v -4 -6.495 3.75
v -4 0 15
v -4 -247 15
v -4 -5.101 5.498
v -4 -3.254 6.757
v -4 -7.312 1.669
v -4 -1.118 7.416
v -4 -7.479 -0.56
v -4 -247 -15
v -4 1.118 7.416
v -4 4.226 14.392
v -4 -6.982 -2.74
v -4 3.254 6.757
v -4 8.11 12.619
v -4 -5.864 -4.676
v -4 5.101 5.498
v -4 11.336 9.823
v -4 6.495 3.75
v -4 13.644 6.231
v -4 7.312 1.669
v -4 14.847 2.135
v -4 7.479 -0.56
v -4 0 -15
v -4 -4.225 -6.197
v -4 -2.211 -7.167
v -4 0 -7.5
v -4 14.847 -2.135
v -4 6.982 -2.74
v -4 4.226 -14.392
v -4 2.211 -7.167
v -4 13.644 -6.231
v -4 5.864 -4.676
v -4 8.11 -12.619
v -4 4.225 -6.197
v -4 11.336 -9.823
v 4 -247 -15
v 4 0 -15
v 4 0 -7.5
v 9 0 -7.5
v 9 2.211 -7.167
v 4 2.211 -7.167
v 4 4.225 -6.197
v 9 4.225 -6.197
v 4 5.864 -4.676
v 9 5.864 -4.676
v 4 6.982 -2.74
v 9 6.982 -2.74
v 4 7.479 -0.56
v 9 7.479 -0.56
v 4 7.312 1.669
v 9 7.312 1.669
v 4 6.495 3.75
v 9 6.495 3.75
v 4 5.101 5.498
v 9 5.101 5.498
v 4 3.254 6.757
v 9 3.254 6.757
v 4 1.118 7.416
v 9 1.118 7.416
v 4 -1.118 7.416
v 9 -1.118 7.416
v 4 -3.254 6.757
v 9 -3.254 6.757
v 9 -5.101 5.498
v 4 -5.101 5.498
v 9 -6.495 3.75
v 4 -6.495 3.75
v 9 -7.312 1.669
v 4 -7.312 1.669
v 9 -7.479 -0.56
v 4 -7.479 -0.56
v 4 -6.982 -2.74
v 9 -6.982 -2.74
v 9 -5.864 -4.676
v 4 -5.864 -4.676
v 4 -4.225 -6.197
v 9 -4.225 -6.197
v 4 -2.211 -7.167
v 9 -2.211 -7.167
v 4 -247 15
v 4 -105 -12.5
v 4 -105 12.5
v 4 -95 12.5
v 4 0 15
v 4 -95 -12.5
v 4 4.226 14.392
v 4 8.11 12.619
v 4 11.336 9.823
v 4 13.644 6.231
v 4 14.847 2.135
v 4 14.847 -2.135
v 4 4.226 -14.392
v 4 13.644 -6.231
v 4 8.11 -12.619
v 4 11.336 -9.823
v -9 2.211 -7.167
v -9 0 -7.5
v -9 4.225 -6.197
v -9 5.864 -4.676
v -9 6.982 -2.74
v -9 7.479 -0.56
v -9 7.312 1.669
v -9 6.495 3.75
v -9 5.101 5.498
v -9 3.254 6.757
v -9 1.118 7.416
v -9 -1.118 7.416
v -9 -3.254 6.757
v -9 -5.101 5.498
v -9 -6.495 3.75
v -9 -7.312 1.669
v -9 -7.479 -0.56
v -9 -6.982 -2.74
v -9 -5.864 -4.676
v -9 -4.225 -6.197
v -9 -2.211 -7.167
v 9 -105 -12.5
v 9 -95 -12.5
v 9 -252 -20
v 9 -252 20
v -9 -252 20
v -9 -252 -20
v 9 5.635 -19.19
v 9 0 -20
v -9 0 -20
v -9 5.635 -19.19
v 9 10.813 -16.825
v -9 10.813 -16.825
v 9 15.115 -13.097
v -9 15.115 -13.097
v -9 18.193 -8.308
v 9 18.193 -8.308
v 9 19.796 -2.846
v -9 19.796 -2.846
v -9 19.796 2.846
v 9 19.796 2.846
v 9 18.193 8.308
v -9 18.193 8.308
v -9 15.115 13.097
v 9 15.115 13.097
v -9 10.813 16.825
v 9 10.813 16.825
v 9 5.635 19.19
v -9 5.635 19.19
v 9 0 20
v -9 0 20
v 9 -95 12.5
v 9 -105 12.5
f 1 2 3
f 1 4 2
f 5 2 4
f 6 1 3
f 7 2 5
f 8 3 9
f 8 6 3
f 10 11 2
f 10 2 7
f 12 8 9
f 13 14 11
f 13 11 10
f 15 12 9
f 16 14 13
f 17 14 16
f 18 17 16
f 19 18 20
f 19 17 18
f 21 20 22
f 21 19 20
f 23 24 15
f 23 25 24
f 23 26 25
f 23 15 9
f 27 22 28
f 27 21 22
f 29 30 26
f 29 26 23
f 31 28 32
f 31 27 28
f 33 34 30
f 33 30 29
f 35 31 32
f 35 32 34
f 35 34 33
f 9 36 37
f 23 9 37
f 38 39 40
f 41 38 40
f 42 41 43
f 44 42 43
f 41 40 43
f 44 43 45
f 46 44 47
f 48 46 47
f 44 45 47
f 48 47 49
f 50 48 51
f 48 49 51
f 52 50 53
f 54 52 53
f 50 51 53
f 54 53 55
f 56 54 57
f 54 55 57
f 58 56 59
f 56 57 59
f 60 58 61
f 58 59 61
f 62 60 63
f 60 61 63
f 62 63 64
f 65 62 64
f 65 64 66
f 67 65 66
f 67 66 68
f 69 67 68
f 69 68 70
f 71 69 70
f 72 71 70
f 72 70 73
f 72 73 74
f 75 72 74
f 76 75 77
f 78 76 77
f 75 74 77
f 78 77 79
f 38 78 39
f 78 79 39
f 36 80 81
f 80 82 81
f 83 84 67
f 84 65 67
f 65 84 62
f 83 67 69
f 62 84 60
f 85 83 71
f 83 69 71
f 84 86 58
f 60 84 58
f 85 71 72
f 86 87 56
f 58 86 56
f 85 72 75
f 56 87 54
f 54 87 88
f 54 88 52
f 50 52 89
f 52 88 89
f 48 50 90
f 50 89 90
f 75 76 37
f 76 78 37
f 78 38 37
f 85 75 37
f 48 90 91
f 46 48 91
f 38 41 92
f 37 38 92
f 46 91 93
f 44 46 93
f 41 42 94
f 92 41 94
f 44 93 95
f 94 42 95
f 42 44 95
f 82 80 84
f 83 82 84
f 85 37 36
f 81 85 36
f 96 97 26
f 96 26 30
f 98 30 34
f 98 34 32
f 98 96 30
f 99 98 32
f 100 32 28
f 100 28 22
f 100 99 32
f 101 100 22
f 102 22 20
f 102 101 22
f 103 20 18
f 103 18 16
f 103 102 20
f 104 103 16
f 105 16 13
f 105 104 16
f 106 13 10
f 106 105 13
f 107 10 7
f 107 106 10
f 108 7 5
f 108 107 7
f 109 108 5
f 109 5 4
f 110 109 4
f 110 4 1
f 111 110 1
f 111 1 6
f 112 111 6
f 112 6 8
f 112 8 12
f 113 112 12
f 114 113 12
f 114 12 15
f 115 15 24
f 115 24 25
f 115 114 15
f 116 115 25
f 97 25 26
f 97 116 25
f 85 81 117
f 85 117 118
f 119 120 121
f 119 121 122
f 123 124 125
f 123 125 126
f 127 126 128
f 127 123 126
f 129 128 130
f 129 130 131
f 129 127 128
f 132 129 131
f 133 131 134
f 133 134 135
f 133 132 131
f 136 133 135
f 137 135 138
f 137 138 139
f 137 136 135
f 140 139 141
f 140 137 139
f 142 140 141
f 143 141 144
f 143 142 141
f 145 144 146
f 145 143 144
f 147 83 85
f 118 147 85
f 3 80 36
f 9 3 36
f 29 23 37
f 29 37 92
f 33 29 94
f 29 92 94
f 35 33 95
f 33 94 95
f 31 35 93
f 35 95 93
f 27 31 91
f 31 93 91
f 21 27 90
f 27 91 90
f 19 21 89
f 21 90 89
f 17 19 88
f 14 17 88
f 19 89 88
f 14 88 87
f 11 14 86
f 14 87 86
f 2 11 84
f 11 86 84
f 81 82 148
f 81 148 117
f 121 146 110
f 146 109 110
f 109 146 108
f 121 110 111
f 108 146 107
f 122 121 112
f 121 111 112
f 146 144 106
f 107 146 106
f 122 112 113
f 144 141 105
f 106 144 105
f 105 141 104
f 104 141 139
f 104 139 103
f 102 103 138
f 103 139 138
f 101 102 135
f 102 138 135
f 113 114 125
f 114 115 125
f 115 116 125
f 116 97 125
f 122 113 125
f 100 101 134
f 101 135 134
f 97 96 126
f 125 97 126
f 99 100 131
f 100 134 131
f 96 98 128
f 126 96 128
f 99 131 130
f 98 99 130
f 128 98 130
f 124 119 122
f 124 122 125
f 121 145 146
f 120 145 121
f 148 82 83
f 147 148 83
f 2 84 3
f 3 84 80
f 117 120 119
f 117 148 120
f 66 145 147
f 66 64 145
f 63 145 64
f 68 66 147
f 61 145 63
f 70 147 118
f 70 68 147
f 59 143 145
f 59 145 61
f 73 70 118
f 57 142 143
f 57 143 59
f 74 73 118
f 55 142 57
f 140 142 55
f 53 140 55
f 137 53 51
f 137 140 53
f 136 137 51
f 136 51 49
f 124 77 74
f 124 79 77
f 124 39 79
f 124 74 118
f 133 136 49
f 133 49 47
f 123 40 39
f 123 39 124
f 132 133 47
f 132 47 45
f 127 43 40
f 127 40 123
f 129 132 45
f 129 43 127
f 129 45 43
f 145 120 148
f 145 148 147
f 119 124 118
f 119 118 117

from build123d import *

# Parameters (mm, degrees)
BOSS_EXTRUDE1_START = -9
SKETCH2_R           = 7.5
BOSS_EXTRUDE1_DEPTH = 5
BOSS_EXTRUDE2_START = -4
BOSS_EXTRUDE2_DEPTH = 4
CUT_EXTRUDE1_START  = 4
SKETCH4_W           = 25
SKETCH4_H           = 10
CUT_EXTRUDE1_DEPTH  = 5


with BuildPart() as part:
    # Sketch2 → Boss-Extrude1 (new body)
    with BuildSketch(Plane(origin=(0, 0, 0), x_dir=(0, 0, -1), z_dir=(1, 0, 0)).offset(BOSS_EXTRUDE1_START)):
        with BuildLine():
            Line((-20, 0), (-20, -252))
            Line((-20, -252), (20, -252))
            Line((20, -252), (20, 0))
            ThreePointArc((20, 0), (0, 20), (-20, 0))
        make_face()
        Circle(SKETCH2_R, mode=Mode.SUBTRACT)
    extrude(amount=BOSS_EXTRUDE1_DEPTH)

    # Sketch2<6> → Boss-Extrude2 (add)
    with BuildSketch(Plane(origin=(0, 0, 0), x_dir=(0, 0, -1), z_dir=(1, 0, 0)).offset(BOSS_EXTRUDE2_START)):
        with BuildLine():
            Line((-20, 0), (-20, -252))
            Line((-20, -252), (20, -252))
            Line((20, -252), (20, 0))
            ThreePointArc((20, 0), (0, 20), (-20, 0))
        make_face()
        with BuildLine():
            Line((-15, 0), (-15, -247))
            Line((-15, -247), (15, -247))
            Line((15, -247), (15, 0))
            ThreePointArc((15, 0), (0, 15), (-15, 0))
        make_face(mode=Mode.SUBTRACT)
    extrude(amount=BOSS_EXTRUDE2_DEPTH)

    # Mirror1: part across plane


with BuildPart() as part_1:
    add(part.part)
    add(part.part.mirror(Plane(origin=(0, 0, 0), x_dir=(0, 0, 1), z_dir=(1, 0, 0))))

    # Sketch4 → Cut-Extrude1 (cut)
    with BuildSketch(Plane(origin=(0, 0, 0), x_dir=(0, 0, -1), z_dir=(1, 0, 0)).offset(CUT_EXTRUDE1_START)):
        with Locations((0, -100)):
            Rectangle(SKETCH4_W, SKETCH4_H)
    extrude(amount=CUT_EXTRUDE1_DEPTH, mode=Mode.SUBTRACT)


solid = part_1.part
